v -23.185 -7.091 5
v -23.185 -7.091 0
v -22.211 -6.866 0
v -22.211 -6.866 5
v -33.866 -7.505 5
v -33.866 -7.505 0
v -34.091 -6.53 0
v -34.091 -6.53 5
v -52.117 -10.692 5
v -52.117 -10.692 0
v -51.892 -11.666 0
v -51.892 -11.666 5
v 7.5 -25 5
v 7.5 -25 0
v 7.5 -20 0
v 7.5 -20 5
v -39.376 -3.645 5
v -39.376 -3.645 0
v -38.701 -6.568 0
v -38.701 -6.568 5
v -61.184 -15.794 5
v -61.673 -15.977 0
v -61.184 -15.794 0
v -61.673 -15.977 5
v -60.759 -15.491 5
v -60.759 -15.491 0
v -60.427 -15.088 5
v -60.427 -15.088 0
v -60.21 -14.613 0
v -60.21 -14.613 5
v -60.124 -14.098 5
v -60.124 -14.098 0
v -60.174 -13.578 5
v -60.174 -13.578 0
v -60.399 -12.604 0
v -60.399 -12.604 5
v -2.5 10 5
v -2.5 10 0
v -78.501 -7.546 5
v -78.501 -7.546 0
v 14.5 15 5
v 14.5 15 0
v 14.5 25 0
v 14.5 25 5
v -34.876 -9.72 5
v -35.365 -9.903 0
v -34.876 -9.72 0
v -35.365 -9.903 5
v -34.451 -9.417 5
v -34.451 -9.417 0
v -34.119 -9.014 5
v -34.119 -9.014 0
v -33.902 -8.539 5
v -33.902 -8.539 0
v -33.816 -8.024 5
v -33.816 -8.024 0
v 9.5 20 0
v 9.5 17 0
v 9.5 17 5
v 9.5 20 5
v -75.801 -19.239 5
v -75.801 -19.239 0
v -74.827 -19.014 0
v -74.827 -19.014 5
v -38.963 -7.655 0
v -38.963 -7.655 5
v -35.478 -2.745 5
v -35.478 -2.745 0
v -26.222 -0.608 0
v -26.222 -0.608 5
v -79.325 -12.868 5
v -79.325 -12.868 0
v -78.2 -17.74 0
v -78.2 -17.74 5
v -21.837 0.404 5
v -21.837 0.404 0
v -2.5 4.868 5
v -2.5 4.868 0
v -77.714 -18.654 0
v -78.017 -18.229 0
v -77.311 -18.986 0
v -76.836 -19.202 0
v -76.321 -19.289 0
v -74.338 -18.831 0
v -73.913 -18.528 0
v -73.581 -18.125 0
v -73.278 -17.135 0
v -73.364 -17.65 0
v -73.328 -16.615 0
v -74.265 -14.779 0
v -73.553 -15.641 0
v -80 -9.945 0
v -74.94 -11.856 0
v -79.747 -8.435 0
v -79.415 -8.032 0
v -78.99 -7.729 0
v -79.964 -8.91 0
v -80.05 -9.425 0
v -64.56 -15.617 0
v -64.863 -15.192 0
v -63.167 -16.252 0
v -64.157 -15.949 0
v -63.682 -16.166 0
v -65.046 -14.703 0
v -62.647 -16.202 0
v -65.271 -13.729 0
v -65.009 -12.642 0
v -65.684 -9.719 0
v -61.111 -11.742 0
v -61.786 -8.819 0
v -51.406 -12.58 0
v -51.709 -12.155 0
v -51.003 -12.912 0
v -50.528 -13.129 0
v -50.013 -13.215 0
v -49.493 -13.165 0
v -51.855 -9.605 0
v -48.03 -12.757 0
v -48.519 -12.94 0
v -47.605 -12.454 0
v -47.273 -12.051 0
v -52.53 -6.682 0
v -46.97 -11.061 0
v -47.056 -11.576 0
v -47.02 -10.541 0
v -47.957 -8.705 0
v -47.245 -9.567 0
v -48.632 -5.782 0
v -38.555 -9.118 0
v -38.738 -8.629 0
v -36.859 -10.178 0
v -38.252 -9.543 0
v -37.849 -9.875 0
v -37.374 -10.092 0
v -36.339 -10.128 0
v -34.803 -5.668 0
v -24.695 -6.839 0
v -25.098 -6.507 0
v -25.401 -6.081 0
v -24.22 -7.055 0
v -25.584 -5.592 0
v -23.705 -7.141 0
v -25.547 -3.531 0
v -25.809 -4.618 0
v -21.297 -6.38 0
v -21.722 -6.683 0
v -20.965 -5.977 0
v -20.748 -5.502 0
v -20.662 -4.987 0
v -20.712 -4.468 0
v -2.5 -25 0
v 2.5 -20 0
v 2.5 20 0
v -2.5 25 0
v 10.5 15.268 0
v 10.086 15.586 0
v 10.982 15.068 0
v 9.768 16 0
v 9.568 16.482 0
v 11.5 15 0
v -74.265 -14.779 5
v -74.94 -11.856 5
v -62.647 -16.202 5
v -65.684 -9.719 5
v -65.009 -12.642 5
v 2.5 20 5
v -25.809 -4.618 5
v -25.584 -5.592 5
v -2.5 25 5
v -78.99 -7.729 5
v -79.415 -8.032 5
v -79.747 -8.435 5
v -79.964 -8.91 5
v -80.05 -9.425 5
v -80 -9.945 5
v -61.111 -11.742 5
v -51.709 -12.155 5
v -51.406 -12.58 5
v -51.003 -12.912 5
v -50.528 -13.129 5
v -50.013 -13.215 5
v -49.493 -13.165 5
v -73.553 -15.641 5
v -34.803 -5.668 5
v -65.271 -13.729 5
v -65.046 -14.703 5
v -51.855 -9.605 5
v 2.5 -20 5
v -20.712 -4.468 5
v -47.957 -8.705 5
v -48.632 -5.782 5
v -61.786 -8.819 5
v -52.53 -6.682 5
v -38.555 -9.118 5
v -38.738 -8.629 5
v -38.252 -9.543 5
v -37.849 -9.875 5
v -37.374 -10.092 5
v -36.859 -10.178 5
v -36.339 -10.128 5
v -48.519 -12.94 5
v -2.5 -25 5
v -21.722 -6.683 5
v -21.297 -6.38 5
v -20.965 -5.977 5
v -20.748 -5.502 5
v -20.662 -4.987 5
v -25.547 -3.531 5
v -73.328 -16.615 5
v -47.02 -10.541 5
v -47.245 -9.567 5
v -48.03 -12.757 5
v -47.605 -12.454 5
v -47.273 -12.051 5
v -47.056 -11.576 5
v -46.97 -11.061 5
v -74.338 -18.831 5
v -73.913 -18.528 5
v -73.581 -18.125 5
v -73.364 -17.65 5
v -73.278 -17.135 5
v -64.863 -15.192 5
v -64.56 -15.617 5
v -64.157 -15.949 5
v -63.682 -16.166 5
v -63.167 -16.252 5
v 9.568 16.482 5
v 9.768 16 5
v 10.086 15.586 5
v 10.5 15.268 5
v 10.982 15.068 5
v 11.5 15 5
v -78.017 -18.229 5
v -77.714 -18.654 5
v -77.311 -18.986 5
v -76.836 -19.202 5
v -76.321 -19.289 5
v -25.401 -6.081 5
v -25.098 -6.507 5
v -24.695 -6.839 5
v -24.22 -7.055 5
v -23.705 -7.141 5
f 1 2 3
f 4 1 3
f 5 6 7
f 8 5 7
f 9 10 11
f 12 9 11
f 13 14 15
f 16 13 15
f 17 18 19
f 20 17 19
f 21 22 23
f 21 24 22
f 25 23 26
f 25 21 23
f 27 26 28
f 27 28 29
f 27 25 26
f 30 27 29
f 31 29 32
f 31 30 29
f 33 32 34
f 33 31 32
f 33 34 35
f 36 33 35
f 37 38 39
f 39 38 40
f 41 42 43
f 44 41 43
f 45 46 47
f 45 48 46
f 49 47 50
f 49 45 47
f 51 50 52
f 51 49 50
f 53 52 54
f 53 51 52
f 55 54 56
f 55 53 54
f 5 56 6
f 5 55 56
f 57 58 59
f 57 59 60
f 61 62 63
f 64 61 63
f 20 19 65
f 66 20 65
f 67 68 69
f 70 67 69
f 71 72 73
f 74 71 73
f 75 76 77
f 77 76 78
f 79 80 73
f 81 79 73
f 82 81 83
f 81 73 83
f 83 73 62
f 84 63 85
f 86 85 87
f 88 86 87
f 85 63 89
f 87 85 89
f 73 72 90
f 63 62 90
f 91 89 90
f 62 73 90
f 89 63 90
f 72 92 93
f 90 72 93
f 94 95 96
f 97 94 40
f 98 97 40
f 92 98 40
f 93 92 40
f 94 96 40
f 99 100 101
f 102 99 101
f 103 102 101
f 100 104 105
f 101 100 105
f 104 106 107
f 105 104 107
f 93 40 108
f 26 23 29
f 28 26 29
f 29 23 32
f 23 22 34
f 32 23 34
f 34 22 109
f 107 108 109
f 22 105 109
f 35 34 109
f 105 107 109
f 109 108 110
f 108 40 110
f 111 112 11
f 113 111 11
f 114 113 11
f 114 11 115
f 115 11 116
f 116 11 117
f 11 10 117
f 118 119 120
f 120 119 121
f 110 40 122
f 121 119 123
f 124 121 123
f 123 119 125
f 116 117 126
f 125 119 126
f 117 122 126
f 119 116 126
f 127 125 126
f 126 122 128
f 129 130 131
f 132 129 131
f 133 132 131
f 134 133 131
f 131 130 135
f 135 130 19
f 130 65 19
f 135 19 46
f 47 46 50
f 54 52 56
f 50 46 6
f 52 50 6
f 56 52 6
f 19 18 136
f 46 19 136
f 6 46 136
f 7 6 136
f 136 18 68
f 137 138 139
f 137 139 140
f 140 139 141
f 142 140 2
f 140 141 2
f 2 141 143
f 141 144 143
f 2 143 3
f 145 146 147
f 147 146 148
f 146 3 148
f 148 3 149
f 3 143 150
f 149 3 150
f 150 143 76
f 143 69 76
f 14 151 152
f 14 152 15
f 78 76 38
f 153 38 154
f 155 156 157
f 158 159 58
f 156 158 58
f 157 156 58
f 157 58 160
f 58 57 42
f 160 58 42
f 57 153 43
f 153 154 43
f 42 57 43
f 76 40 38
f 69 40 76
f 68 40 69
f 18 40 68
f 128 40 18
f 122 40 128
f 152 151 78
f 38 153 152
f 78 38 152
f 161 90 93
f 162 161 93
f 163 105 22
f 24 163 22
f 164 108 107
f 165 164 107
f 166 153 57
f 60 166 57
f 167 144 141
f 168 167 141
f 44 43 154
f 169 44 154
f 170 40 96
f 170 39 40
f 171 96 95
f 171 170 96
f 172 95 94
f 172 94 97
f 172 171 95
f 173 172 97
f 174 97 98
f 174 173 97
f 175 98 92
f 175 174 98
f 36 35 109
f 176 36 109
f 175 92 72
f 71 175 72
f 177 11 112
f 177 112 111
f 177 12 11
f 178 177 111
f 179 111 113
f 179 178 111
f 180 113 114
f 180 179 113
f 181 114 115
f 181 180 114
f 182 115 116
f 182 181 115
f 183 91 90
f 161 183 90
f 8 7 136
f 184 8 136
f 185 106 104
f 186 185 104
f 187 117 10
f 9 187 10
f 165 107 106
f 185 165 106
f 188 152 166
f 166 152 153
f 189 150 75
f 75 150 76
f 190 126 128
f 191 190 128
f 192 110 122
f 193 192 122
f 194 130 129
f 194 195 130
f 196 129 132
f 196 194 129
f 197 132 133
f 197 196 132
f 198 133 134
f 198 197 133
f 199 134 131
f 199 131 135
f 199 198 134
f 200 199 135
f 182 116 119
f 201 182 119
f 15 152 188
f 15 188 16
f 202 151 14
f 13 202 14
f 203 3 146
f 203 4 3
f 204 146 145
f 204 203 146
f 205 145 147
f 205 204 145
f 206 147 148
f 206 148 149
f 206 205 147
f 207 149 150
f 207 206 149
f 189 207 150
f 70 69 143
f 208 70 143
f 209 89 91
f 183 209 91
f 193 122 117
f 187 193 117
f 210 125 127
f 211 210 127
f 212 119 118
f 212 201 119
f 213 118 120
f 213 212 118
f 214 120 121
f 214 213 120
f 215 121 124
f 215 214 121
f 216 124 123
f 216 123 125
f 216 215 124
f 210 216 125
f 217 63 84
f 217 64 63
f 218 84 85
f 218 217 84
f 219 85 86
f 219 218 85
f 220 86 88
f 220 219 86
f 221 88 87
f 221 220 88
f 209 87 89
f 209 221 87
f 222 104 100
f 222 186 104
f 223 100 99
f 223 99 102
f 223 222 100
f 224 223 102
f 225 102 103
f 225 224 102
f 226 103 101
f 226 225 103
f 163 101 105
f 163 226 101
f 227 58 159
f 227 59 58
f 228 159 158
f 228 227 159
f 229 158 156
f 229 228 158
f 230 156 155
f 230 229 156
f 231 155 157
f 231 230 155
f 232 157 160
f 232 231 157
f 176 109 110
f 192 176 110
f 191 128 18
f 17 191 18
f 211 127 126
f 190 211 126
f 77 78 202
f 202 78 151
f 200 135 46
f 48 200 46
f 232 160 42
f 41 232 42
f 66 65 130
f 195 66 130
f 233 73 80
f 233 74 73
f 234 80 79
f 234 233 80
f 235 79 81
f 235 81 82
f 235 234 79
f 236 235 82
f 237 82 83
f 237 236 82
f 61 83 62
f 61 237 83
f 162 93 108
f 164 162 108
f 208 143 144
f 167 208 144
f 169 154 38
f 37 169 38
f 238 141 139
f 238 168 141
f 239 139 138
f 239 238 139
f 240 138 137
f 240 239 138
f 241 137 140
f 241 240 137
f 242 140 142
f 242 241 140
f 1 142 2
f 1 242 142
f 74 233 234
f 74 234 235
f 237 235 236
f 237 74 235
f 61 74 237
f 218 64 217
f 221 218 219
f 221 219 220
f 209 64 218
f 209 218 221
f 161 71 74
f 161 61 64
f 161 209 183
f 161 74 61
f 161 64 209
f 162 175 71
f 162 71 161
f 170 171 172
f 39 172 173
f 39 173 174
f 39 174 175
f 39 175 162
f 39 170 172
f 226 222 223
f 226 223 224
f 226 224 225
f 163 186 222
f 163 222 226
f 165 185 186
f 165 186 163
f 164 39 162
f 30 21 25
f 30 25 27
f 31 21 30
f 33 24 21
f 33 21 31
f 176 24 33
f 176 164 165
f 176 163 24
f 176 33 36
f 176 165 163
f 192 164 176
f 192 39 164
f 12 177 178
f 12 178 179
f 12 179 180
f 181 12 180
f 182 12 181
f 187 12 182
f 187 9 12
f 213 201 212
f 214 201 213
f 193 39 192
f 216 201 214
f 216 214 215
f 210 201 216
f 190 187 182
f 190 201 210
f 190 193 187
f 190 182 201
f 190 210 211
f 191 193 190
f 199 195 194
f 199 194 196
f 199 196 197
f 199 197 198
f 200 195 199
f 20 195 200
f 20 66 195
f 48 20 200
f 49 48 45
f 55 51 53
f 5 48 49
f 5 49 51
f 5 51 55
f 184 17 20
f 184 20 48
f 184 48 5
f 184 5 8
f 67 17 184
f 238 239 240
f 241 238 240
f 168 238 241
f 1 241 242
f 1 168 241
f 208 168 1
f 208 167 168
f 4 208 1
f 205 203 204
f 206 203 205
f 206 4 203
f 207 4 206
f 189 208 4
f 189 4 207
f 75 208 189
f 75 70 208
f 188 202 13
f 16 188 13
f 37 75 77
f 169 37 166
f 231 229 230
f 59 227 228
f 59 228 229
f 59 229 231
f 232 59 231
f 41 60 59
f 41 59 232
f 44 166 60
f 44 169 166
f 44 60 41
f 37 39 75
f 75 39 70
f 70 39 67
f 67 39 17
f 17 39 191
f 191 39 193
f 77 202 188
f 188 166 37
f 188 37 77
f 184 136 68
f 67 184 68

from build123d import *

# Parameters (mm, degrees)
F0_W     = 5
F0_H     = 5
F1_DEPTH = 5
F2_R     = 2


with BuildPart() as f1:
    # F0 (on Top) → F1 (new body)
    with BuildSketch(Plane.XY):
        Polygon((2.5, 20), (2.5, 25), (-2.5, 25), (-2.5, 10), (-2.5, 4.868479), (-2.5, -25), (2.5, -25), (2.5, -20), align=None)
        Polygon((14.5, 25), (2.5, 25), (2.5, 20), (9.5, 20), (14.5, 20), align=None)
        Polygon((-2.5, 4.868479), (-2.5, 10), (-80.449605, -7.996084), (-79.32485, -12.867935), (-74.940185, -11.855655), (-65.683669, -9.71862), (-61.786189, -8.818816), (-52.529673, -6.681781), (-48.632193, -5.781976), (-39.375677, -3.644941), (-35.478197, -2.745137), (-26.221681, -0.608102), (-21.837016, 0.404178), align=None)
        with Locations((5, -22.5)):
            Rectangle(F0_W, F0_H)
        with Locations((12, 17.5)):
            Rectangle(F0_W, F0_H)
        Polygon((-20.262359, -6.416413), (-21.837016, 0.404178), (-26.221681, -0.608102), (-25.546828, -3.531212), (-25.809062, -4.618058), (-25.134209, -7.541168), align=None)
        Polygon((-74.940185, -11.855655), (-79.32485, -12.867935), (-77.750193, -19.688525), (-72.878342, -18.56377), (-73.553195, -15.64066), (-74.265331, -14.778765), align=None)
        Polygon((-34.803344, -5.668247), (-35.478197, -2.745137), (-39.375677, -3.644941), (-38.700824, -6.568052), (-38.963058, -7.654897), (-38.288205, -10.578007), (-33.416355, -9.453252), (-34.091208, -6.530142), align=None)
        Polygon((-61.786189, -8.818816), (-65.683669, -9.71862), (-65.008816, -12.64173), (-65.27105, -13.728576), (-64.596197, -16.651686), (-59.724346, -15.526931), (-60.399199, -12.60382), (-61.111336, -11.741926), align=None)
        Polygon((-47.95734, -8.705087), (-48.632193, -5.781976), (-52.529673, -6.681781), (-51.85482, -9.604891), (-52.117054, -10.691736), (-51.442201, -13.614847), (-46.57035, -12.490091), (-47.245204, -9.566981), align=None)
    extrude(amount=F1_DEPTH)

    # F2
    f2_edges = [f1.edges().sort_by_distance(p)[0] for p in [
        (-72.878342, -18.56377, 2.5),
        (-64.596197, -16.651686, 2.5),
        (-59.724346, -15.526931, 2.5),
        (-51.442201, -13.614847, 2.5),
        (-46.57035, -12.490091, 2.5),
        (-38.288205, -10.578007, 2.5),
        (-33.416355, -9.453252, 2.5),
        (-25.134209, -7.541168, 2.5),
        (-77.750193, -19.688525, 2.5),
        (-80.449605, -7.996084, 2.5),
        (-20.262359, -6.416413, 2.5),
        (9.5, 15, 2.5),
    ]]
    fillet(f2_edges, radius=F2_R)


solid = f1.part
